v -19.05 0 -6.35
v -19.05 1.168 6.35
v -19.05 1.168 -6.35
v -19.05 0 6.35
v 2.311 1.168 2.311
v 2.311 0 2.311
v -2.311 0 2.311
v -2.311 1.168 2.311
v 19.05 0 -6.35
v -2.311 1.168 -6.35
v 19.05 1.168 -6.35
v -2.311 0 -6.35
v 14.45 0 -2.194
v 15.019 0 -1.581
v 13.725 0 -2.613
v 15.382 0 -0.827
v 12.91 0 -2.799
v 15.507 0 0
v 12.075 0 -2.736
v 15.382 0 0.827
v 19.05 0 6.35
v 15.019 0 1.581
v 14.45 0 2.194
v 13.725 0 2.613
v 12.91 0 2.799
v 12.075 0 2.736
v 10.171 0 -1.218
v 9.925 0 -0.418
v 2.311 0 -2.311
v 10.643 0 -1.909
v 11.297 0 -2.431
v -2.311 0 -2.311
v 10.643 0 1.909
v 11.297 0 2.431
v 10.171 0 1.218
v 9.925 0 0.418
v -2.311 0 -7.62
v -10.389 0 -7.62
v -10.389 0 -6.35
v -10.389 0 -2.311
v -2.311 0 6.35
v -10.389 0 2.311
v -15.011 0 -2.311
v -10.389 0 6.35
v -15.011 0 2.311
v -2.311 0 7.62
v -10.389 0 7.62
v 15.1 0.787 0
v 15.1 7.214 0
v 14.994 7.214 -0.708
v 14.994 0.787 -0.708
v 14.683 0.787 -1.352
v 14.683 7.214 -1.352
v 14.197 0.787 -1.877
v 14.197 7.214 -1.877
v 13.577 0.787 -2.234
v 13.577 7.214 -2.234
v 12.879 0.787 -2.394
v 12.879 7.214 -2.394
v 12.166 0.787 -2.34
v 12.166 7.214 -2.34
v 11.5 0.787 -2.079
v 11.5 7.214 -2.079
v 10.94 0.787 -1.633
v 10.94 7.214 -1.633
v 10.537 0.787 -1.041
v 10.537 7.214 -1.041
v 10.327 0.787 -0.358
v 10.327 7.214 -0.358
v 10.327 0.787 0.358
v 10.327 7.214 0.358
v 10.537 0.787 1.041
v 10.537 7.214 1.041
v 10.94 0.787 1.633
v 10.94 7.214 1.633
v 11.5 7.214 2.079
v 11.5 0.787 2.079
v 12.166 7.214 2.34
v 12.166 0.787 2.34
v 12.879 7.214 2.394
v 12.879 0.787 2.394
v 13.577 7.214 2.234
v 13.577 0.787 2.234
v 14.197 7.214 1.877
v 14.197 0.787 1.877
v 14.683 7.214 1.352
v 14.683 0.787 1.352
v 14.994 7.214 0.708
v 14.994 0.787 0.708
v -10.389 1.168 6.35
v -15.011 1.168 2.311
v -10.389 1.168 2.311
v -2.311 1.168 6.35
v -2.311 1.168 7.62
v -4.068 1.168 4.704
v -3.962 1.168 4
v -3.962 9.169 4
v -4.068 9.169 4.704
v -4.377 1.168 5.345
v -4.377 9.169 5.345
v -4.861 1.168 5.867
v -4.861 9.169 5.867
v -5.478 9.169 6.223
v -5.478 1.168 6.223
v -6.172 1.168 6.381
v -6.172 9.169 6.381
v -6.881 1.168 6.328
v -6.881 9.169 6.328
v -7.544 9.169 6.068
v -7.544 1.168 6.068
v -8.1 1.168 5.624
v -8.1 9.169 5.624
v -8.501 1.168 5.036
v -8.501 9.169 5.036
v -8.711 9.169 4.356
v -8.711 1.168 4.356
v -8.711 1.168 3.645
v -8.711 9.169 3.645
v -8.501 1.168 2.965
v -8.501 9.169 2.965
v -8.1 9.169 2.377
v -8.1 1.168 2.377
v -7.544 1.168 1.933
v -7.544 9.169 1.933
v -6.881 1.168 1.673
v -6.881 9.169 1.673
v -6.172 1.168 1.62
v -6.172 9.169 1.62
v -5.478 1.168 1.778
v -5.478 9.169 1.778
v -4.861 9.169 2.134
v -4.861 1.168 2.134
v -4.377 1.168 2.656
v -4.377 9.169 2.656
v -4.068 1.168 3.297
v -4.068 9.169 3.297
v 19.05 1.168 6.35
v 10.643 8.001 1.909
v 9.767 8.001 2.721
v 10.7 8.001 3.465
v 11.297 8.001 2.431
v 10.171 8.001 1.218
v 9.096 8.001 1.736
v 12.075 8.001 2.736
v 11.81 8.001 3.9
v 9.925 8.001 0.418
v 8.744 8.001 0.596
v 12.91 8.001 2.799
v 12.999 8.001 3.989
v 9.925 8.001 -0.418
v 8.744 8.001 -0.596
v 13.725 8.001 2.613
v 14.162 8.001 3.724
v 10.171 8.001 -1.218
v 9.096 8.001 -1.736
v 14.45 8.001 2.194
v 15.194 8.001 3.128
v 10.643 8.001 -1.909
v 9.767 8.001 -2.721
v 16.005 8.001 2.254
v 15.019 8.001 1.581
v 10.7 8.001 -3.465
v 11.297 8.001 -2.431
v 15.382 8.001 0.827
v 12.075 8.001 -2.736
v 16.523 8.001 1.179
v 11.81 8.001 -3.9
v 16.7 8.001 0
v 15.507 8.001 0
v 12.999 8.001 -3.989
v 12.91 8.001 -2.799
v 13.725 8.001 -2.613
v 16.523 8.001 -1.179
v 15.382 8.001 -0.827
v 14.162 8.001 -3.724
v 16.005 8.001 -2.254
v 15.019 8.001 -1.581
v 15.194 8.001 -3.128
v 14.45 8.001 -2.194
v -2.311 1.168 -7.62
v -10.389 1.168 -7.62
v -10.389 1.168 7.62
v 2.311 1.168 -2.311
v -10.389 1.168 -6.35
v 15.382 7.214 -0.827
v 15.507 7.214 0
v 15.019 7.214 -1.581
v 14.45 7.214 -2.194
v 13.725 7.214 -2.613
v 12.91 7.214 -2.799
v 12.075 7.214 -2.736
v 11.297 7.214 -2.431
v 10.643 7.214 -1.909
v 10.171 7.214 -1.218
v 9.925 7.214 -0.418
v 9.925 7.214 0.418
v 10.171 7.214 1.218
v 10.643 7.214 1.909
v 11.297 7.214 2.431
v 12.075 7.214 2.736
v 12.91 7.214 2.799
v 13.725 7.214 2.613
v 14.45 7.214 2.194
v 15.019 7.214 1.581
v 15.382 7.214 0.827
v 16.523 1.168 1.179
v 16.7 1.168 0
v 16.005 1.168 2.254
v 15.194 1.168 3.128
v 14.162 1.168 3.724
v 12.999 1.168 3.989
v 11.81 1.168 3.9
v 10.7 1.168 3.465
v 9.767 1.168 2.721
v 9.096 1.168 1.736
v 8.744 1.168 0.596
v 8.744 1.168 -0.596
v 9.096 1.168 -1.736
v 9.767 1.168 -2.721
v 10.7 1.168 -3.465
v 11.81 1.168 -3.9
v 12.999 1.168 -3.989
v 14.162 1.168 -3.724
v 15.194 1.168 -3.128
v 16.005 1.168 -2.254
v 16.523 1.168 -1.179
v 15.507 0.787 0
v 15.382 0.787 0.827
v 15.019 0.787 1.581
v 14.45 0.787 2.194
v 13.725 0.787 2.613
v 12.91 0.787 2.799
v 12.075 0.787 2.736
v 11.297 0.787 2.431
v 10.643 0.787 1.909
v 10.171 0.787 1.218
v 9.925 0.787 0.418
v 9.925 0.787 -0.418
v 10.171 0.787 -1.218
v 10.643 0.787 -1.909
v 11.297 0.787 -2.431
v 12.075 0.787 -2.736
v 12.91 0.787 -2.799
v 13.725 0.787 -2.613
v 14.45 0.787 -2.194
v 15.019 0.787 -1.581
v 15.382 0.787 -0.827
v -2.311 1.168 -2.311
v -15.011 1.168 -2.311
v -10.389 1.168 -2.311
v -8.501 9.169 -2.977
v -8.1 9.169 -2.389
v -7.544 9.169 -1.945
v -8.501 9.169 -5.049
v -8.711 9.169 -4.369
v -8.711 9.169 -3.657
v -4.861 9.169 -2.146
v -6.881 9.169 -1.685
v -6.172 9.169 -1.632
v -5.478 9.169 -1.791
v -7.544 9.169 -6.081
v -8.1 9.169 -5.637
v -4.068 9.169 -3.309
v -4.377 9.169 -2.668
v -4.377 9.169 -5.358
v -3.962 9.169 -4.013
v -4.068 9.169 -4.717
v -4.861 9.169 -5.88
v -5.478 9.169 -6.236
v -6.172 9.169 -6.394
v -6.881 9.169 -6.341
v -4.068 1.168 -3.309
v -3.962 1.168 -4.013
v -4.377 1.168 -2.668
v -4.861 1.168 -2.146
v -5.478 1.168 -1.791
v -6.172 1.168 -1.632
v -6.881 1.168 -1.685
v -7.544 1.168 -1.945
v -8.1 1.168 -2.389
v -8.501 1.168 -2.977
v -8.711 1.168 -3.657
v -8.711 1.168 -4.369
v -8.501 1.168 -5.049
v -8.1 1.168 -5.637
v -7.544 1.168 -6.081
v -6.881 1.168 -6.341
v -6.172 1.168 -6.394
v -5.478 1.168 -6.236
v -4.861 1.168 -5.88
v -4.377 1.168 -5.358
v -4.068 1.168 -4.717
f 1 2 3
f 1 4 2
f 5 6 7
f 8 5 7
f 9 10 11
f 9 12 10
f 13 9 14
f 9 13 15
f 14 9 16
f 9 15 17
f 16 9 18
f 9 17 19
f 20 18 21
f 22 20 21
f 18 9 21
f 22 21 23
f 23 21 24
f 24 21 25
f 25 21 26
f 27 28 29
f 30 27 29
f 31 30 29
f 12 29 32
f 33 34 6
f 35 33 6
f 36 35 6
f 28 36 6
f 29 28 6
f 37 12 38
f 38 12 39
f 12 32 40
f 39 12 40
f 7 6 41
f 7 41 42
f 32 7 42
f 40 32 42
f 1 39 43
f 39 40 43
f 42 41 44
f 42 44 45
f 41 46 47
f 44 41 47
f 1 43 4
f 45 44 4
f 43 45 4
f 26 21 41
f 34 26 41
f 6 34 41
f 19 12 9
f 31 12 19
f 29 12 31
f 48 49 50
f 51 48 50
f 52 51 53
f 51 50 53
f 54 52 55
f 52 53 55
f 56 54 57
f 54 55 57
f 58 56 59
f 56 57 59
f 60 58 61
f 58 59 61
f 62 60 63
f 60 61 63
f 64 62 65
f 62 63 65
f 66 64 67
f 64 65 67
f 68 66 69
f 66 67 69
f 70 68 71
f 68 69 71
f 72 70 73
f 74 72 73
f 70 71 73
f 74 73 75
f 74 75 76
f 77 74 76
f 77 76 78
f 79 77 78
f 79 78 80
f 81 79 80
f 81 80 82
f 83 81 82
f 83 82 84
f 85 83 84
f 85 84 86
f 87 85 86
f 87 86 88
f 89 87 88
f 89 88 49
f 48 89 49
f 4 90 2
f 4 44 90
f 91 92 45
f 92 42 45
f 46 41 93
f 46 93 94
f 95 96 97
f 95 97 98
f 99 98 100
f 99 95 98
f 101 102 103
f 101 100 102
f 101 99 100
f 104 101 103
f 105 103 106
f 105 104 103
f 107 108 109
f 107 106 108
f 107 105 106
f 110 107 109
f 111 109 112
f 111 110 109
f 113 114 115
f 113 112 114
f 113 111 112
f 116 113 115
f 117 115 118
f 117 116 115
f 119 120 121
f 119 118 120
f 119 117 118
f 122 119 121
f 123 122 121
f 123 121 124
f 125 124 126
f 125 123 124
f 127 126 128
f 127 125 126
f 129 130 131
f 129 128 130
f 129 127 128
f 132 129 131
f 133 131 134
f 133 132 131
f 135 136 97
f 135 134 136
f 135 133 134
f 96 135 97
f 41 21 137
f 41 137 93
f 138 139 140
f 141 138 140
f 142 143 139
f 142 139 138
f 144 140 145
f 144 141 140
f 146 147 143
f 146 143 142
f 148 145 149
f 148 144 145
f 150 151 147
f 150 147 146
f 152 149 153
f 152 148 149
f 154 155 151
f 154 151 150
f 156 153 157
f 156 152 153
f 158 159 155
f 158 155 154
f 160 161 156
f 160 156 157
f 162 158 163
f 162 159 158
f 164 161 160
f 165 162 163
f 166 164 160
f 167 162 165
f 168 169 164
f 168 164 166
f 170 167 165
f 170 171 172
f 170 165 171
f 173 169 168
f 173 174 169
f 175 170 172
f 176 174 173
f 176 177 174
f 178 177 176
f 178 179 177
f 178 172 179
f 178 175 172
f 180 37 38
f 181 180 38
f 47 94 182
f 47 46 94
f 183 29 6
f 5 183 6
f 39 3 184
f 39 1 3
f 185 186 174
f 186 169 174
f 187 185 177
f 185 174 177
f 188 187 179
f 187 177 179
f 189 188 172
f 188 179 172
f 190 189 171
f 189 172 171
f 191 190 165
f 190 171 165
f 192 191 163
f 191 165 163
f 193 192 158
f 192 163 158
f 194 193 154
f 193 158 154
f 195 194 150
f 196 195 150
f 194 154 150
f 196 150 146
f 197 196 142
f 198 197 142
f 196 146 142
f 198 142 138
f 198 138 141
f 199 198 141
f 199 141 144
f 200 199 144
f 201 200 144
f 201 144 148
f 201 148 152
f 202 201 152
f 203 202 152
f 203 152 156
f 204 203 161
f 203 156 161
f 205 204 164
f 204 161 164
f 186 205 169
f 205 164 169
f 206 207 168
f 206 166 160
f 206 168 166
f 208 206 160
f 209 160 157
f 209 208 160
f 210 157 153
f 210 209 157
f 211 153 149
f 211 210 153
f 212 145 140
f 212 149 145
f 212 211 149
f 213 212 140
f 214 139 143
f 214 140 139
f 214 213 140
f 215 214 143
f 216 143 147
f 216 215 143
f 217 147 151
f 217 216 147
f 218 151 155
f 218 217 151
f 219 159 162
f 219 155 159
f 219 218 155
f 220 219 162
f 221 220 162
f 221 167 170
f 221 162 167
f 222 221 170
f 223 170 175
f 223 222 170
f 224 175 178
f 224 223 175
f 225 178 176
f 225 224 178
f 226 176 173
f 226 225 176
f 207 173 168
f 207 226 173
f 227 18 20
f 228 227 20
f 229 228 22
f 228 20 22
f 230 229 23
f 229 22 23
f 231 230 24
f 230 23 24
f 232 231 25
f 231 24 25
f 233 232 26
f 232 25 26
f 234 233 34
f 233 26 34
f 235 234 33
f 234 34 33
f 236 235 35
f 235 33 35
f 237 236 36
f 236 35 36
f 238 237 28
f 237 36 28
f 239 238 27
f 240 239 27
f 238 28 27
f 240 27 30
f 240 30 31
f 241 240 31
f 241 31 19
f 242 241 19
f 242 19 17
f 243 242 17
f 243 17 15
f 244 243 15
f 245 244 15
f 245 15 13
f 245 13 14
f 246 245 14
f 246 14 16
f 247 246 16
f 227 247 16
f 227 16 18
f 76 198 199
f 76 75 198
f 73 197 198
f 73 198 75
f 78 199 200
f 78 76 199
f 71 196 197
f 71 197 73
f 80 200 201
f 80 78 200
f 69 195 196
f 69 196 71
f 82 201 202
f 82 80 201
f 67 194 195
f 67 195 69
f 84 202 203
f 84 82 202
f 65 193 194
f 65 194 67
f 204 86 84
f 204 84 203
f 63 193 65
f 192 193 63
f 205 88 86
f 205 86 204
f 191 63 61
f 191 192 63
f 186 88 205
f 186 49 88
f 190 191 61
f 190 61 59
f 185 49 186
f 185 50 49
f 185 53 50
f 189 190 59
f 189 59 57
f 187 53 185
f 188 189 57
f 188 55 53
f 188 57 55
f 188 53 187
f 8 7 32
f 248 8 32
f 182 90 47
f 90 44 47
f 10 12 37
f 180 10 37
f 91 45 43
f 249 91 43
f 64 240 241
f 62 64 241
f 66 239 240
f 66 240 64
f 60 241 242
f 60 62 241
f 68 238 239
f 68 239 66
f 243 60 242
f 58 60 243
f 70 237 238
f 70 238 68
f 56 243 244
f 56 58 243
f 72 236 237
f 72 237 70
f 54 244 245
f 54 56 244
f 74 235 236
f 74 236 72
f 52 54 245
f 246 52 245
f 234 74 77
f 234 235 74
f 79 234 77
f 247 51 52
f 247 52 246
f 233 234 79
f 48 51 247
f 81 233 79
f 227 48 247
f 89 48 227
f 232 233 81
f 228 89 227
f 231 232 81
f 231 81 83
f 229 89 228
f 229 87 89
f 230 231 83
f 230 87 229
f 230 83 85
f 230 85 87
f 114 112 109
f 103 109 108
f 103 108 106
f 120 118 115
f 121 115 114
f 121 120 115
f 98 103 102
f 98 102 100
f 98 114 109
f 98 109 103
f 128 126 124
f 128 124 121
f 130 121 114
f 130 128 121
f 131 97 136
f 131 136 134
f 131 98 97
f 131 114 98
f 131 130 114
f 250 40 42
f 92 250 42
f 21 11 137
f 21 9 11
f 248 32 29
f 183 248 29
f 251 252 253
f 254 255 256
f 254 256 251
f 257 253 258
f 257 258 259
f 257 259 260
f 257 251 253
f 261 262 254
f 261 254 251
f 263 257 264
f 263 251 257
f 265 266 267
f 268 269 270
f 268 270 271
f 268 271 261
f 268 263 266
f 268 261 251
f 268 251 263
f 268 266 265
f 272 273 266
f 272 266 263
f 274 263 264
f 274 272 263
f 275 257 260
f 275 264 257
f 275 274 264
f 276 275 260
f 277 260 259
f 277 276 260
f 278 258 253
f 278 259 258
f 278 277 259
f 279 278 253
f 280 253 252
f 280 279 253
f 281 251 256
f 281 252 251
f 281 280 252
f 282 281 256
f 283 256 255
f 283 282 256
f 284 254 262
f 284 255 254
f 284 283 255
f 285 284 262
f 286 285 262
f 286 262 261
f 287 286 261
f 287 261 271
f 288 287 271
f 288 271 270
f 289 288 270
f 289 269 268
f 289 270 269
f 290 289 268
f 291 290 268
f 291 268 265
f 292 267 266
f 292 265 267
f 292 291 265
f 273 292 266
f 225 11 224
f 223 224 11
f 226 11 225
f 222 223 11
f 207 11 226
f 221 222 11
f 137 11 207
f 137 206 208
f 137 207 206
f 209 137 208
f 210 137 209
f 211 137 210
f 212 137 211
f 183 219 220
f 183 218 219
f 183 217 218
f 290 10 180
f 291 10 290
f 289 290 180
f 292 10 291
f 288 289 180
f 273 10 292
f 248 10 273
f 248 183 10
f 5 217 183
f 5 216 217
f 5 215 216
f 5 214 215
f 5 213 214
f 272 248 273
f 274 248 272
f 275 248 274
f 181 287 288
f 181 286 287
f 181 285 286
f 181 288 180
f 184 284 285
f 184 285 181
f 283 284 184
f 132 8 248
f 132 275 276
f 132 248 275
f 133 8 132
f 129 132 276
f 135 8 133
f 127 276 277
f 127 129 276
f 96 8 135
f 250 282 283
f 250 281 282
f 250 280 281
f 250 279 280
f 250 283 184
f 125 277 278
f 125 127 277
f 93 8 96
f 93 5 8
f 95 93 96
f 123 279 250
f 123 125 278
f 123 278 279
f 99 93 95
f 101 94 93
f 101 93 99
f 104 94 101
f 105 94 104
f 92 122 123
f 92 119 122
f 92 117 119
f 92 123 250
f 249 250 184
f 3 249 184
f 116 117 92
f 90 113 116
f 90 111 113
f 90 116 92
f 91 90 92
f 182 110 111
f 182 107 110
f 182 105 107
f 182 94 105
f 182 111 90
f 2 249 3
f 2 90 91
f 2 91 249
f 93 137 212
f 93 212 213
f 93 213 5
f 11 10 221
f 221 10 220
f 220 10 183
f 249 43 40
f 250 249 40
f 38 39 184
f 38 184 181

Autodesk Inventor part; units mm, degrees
ref_plane "YZ Plane" through (0, 0, 0) normal (1, 0, 0) x (0, 1, 0)
ref_plane "XZ Plane" through (0, 0, 0) normal (0, 1, 0) x (-1, 0, 0)
ref_plane "XY Plane" through (0, 0, 0) normal (0, 0, 1) x (1, 0, 0)
sketch "Sketch4" plane through (0, 0, 0) normal (0, 1, 0) x (-1, 0, 0)
  line L0 (-19.05, 6.35) -> (2.3114, 6.35)
  line L1 (19.05, 6.35) -> (19.05, -6.35)
  line L2 (19.05, -6.35) -> (10.3886, -6.35)
  line L3 (-19.05, -6.35) -> (-19.05, 6.35)
  line L4 (-19.05, 6.35) -> (19.05, -6.35) construction
  line L5 (19.05, 6.35) -> (-19.05, -6.35) construction
  line L6 (-2.3114, 2.3114) -> (2.3114, 2.3114)
  line L7 (2.3114, 2.3114) -> (2.3114, -2.3114)
  line L8 (2.3114, -2.3114) -> (-2.3114, -2.3114)
  line L9 (-2.3114, -2.3114) -> (-2.3114, 2.3114)
  line L10 (-2.3114, 2.3114) -> (2.3114, -2.3114) construction
  line L11 (2.3114, 2.3114) -> (-2.3114, -2.3114) construction
  line L12 (10.3886, 2.3114) -> (15.0114, 2.3114)
  line L13 (15.0114, 2.3114) -> (15.0114, -2.3114)
  line L14 (15.0114, -2.3114) -> (10.3886, -2.3114)
  line L15 (10.3886, -2.3114) -> (10.3886, 2.3114)
  line L16 (10.3886, 2.3114) -> (15.0114, -2.3114) construction
  line L17 (15.0114, 2.3114) -> (10.3886, -2.3114) construction
  line L18 (10.3886, 6.35) -> (10.3886, 7.62)
  line L19 (2.3114, 6.35) -> (2.3114, 7.62)
  line L20 (2.3114, 7.62) -> (10.3886, 7.62)
  line L21 (10.3886, -6.35) -> (10.3886, -7.62)
  line L22 (2.3114, -6.35) -> (2.3114, -7.62)
  line L23 (2.3114, -7.62) -> (10.3886, -7.62)
  line L24 (10.3886, 6.35) -> (19.05, 6.35)
  line L25 (2.3114, -6.35) -> (-19.05, -6.35)
  point P0 (0, 0)
  point P1 (12.7, 0)
  dimension "d14" = 38.1
  dimension "d15" = 12.7
  dimension "d16" = 4.6228
  dimension "d17" = 4.6228
  dimension "d18" = 4.6228
  dimension "d19" = 12.7
  dimension "d20" = 1.27
  dimension "d27" = 1.27
extrude "Extrusion2" add sketch "Sketch4" along normal blind 1.1684
sketch "Sketch5" plane through (0, 1.1684, 0) normal (0, 1, 0) x (1, 0, 0)
  circle A0 centre (-6.35, -4.0005) radius 2.3876
  point P0 (0, 0)
  point P1 (-6.35, 0)
  dimension "d24" = 6.35
  dimension "d25" = 4.7752
  dimension "d26" = 4.0005
sketch "Sketch6" plane through (0, 1.1684, 0) normal (0, 1, 0) x (1, 0, 0)
  circle A0 centre (-6.35, 4.0132) radius 2.3876
  point P0 (0, 0)
  point P1 (-6.35, 0)
  dimension "d29" = 6.35
  dimension "d30" = 4.7752
  dimension "d31" = 4.0132
extrude "Extrusion3" add sketch "Sketch5" along normal blind 8.001
extrude "Extrusion4" add sketch "Sketch6" along normal blind 8.001
sketch "Sketch8" plane through (0, 1.1684, 0) normal (0, 1, 0) x (1, 0, 0)
  circle A0 centre (12.7, 0) radius 4.0005
  point P0 (0, 0)
  dimension "d41" = 12.7
  dimension "d45" = 8.001
extrude "Extrusion6" add sketch "Sketch8" along normal blind 6.8326
sketch "Sketch9" plane through (12.7, 8.001, 0) normal (0, 1, 0) x (1, 0, 0)
  circle A0 centre (0, 0) radius 2.8067
  point P0 (-12.7, 0)
  dimension "d48" = 5.6134
extrude "Extrusion7" cut sketch "Sketch9" against normal blind 0.7874
sketch "Sketch10" plane through (12.7, 7.2136, 0) normal (0, 1, 0) x (1, 0, 0)
  circle A0 centre (0, 0) radius 2.4003
  point P0 (-12.7, 0)
  dimension "d51" = 4.8006
extrude "Extrusion8" cut sketch "Sketch10" against normal through all
sketch "Sketch11" plane through (0, 0, 0) normal (0, -1, 0) x (1, 0, 0)
  circle A0 centre (12.7, 0) radius 4.0005 projected
  circle A1 centre (12.7, 0) radius 2.8067
  point P0 (0, 0)
  dimension "d54" = 12.7
  dimension "d55" = 5.6134
extrude "Extrusion9" cut sketch "Sketch11" against normal blind 0.7874 contours A1
properties part number "VexLegoWidget2"
